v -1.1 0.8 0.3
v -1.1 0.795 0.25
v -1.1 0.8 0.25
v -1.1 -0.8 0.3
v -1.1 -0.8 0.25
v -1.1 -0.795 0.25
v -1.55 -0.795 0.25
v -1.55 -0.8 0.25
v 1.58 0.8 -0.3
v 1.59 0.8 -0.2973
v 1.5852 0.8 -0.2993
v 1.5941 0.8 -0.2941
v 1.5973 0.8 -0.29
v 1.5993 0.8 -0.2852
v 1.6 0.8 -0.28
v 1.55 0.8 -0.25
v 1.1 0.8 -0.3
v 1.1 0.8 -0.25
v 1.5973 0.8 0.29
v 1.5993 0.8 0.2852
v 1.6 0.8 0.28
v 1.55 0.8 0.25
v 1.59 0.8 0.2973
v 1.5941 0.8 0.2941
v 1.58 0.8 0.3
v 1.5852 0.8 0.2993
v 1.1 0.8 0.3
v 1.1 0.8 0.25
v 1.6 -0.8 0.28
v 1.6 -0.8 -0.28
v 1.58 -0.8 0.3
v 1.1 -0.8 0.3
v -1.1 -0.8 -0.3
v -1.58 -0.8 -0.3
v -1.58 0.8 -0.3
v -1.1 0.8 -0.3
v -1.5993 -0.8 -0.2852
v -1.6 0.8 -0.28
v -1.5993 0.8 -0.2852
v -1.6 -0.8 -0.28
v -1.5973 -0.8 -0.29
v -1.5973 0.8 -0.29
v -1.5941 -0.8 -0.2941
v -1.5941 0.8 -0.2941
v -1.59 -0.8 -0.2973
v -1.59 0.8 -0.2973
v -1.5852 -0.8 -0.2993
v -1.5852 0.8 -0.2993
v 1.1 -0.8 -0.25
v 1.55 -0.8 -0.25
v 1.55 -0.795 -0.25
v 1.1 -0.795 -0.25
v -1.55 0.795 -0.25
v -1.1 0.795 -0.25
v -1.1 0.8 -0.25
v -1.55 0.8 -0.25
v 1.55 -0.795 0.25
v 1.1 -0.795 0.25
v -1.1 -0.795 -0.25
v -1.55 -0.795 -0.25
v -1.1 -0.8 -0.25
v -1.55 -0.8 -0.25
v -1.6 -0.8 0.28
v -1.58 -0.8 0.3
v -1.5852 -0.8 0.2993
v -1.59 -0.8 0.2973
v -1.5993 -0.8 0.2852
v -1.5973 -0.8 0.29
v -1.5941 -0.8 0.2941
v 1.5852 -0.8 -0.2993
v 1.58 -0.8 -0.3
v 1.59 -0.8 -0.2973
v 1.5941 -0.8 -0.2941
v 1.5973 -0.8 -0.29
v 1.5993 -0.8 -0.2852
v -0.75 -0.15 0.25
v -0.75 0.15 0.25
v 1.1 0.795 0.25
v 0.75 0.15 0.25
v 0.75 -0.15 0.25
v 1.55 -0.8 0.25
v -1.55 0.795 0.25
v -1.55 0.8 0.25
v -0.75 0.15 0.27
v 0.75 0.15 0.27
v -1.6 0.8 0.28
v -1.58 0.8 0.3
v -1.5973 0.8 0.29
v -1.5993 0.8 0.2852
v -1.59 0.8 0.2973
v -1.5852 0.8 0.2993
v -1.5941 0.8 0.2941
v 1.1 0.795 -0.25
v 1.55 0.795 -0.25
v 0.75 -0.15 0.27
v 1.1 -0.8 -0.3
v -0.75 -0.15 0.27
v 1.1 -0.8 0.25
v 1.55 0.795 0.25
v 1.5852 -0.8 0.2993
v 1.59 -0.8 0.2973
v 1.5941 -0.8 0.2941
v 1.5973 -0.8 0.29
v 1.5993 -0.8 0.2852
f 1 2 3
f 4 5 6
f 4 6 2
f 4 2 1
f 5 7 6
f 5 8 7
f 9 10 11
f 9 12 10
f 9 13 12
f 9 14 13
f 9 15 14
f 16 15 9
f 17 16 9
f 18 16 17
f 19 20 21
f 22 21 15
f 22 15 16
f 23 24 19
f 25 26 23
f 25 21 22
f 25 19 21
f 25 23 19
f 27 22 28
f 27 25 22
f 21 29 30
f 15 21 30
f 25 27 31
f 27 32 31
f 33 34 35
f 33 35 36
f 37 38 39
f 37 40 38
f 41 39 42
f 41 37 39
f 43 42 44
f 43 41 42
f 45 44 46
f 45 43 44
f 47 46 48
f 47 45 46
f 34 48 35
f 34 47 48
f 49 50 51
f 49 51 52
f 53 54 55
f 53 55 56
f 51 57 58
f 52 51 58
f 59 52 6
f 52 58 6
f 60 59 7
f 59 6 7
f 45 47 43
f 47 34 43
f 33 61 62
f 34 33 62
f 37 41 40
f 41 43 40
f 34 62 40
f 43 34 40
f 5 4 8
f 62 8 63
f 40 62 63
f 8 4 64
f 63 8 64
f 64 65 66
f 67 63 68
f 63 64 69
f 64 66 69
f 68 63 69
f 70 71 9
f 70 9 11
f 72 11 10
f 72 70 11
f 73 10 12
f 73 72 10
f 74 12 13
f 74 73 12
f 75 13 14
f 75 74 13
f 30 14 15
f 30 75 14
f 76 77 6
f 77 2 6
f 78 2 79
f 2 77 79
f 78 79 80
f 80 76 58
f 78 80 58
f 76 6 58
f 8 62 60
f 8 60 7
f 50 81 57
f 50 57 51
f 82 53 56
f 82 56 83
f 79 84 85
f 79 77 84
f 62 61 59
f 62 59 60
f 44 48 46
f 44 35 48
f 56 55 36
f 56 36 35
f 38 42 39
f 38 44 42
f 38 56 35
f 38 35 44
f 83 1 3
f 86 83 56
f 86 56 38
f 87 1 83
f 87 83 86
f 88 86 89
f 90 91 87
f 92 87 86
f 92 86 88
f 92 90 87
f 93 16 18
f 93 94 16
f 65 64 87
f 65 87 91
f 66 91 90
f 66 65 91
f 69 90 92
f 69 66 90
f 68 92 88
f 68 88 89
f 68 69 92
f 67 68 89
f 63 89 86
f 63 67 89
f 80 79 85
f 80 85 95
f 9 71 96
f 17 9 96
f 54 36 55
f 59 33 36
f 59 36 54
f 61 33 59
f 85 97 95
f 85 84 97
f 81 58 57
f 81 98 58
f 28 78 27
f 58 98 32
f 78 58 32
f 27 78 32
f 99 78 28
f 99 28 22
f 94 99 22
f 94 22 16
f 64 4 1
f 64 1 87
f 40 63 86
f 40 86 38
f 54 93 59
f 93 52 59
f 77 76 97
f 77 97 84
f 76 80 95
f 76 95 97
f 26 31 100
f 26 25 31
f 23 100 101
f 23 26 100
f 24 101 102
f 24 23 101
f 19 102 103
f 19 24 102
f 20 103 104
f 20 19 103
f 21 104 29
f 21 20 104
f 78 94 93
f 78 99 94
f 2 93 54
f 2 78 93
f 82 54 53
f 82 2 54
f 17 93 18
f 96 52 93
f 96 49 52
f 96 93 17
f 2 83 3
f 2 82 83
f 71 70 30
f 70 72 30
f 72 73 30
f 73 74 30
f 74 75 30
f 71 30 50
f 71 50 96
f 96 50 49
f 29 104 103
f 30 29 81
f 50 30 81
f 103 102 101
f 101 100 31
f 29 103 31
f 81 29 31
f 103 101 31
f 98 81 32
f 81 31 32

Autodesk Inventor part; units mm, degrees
ref_plane "YZ Plane" through (0, 0, 0) normal (1, 0, 0) x (0, 1, 0)
ref_plane "XZ Plane" through (0, 0, 0) normal (0, 1, 0) x (-1, 0, 0)
ref_plane "XY Plane" through (0, 0, 0) normal (0, 0, 1) x (1, 0, 0)
sketch "Sketch1" plane through (0, 0, 0) normal (0, 1, 0) x (-1, 0, 0)
  line L0 (1.55, 0.25) -> (-1.55, 0.25)
  line L1 (-1.55, 0.25) -> (-1.55, -0.25)
  line L2 (-1.55, -0.25) -> (1.55, -0.25)
  line L3 (1.55, -0.25) -> (1.55, 0.25)
  line L4 (1.1, 0.25) -> (1.1, 0.3)
  line L5 (1.1, 0.3) -> (1.6, 0.3)
  line L6 (1.6, 0.3) -> (1.6, -0.3)
  line L7 (1.6, -0.3) -> (1.1, -0.3)
  line L8 (1.1, -0.3) -> (1.1, -0.25)
  line L9 (-1.1, 0.25) -> (-1.1, 0.3)
  line L10 (-1.1, 0.3) -> (-1.6, 0.3)
  line L11 (-1.6, 0.3) -> (-1.6, -0.3)
  line L12 (-1.6, -0.3) -> (-1.1, -0.3)
  line L13 (-1.1, -0.25) -> (-1.1, -0.3)
  line L14 (1.1, 0.25) -> (-1.1, 0.25)
  point P0 (0, 0)
  point P1 (0, 0.25)
  point P2 (1.55, 0)
  dimension "d0" = 3.2
  dimension "d1" = 0.05
  dimension "d2" = 0.05
  dimension "d3" = 0.6
  dimension "d4" = 0.5
extrude "Extrusion1" add sketch "Sketch1" along normal mid plane 1.6 contours L0 L4 L5 L6 L7 L8 L2 L3 | L0 L1 L2 L13 L12 L11 L10 L9
extrude "Extrusion2" add sketch "Sketch1" along normal mid plane 1.59 contours L3 L2 L1 L0
sketch "Sketch2" plane through (-1.1, -0.795, 0.25) normal (0, 0, 1) x (1, 0, 0)
  line L0 (0, 0) -> (0, 1.59) projected
  line L1 (2.2, 0) -> (0, 0) projected
  line L2 (2.2, 0) -> (2.2, 1.59) projected
  line L3 (0, 1.59) -> (2.2, 1.59) projected
  line L4 (0, 0.795) -> (2.2, 0.795) construction
  line L5 (1.85, 0.645) -> (0.35, 0.645)
  line L6 (0.35, 0.645) -> (0.35, 0.945)
  line L7 (0.35, 0.945) -> (1.85, 0.945)
  line L8 (1.85, 0.945) -> (1.85, 0.645)
  line L9 (1.85, 0.645) -> (0.35, 0.945) construction
  line L10 (0.35, 0.645) -> (1.85, 0.945) construction
  point P0 (1.1, 0.795)
  dimension "d12" = 1.5
  dimension "d13" = 0.3
extrude "Extrusion3" add sketch "Sketch2" along normal blind 0.02 contours L5 L6 L7 L8
fillet "Fillet1" radius 0.02 4 edges at (-1.6, 0, 0.3) (-1.6, 0, -0.3) (1.6, 0, 0.3) (1.6, 0, -0.3)
equation "\"d2\" = d1"
properties part number "21-1001" material "Copper"
